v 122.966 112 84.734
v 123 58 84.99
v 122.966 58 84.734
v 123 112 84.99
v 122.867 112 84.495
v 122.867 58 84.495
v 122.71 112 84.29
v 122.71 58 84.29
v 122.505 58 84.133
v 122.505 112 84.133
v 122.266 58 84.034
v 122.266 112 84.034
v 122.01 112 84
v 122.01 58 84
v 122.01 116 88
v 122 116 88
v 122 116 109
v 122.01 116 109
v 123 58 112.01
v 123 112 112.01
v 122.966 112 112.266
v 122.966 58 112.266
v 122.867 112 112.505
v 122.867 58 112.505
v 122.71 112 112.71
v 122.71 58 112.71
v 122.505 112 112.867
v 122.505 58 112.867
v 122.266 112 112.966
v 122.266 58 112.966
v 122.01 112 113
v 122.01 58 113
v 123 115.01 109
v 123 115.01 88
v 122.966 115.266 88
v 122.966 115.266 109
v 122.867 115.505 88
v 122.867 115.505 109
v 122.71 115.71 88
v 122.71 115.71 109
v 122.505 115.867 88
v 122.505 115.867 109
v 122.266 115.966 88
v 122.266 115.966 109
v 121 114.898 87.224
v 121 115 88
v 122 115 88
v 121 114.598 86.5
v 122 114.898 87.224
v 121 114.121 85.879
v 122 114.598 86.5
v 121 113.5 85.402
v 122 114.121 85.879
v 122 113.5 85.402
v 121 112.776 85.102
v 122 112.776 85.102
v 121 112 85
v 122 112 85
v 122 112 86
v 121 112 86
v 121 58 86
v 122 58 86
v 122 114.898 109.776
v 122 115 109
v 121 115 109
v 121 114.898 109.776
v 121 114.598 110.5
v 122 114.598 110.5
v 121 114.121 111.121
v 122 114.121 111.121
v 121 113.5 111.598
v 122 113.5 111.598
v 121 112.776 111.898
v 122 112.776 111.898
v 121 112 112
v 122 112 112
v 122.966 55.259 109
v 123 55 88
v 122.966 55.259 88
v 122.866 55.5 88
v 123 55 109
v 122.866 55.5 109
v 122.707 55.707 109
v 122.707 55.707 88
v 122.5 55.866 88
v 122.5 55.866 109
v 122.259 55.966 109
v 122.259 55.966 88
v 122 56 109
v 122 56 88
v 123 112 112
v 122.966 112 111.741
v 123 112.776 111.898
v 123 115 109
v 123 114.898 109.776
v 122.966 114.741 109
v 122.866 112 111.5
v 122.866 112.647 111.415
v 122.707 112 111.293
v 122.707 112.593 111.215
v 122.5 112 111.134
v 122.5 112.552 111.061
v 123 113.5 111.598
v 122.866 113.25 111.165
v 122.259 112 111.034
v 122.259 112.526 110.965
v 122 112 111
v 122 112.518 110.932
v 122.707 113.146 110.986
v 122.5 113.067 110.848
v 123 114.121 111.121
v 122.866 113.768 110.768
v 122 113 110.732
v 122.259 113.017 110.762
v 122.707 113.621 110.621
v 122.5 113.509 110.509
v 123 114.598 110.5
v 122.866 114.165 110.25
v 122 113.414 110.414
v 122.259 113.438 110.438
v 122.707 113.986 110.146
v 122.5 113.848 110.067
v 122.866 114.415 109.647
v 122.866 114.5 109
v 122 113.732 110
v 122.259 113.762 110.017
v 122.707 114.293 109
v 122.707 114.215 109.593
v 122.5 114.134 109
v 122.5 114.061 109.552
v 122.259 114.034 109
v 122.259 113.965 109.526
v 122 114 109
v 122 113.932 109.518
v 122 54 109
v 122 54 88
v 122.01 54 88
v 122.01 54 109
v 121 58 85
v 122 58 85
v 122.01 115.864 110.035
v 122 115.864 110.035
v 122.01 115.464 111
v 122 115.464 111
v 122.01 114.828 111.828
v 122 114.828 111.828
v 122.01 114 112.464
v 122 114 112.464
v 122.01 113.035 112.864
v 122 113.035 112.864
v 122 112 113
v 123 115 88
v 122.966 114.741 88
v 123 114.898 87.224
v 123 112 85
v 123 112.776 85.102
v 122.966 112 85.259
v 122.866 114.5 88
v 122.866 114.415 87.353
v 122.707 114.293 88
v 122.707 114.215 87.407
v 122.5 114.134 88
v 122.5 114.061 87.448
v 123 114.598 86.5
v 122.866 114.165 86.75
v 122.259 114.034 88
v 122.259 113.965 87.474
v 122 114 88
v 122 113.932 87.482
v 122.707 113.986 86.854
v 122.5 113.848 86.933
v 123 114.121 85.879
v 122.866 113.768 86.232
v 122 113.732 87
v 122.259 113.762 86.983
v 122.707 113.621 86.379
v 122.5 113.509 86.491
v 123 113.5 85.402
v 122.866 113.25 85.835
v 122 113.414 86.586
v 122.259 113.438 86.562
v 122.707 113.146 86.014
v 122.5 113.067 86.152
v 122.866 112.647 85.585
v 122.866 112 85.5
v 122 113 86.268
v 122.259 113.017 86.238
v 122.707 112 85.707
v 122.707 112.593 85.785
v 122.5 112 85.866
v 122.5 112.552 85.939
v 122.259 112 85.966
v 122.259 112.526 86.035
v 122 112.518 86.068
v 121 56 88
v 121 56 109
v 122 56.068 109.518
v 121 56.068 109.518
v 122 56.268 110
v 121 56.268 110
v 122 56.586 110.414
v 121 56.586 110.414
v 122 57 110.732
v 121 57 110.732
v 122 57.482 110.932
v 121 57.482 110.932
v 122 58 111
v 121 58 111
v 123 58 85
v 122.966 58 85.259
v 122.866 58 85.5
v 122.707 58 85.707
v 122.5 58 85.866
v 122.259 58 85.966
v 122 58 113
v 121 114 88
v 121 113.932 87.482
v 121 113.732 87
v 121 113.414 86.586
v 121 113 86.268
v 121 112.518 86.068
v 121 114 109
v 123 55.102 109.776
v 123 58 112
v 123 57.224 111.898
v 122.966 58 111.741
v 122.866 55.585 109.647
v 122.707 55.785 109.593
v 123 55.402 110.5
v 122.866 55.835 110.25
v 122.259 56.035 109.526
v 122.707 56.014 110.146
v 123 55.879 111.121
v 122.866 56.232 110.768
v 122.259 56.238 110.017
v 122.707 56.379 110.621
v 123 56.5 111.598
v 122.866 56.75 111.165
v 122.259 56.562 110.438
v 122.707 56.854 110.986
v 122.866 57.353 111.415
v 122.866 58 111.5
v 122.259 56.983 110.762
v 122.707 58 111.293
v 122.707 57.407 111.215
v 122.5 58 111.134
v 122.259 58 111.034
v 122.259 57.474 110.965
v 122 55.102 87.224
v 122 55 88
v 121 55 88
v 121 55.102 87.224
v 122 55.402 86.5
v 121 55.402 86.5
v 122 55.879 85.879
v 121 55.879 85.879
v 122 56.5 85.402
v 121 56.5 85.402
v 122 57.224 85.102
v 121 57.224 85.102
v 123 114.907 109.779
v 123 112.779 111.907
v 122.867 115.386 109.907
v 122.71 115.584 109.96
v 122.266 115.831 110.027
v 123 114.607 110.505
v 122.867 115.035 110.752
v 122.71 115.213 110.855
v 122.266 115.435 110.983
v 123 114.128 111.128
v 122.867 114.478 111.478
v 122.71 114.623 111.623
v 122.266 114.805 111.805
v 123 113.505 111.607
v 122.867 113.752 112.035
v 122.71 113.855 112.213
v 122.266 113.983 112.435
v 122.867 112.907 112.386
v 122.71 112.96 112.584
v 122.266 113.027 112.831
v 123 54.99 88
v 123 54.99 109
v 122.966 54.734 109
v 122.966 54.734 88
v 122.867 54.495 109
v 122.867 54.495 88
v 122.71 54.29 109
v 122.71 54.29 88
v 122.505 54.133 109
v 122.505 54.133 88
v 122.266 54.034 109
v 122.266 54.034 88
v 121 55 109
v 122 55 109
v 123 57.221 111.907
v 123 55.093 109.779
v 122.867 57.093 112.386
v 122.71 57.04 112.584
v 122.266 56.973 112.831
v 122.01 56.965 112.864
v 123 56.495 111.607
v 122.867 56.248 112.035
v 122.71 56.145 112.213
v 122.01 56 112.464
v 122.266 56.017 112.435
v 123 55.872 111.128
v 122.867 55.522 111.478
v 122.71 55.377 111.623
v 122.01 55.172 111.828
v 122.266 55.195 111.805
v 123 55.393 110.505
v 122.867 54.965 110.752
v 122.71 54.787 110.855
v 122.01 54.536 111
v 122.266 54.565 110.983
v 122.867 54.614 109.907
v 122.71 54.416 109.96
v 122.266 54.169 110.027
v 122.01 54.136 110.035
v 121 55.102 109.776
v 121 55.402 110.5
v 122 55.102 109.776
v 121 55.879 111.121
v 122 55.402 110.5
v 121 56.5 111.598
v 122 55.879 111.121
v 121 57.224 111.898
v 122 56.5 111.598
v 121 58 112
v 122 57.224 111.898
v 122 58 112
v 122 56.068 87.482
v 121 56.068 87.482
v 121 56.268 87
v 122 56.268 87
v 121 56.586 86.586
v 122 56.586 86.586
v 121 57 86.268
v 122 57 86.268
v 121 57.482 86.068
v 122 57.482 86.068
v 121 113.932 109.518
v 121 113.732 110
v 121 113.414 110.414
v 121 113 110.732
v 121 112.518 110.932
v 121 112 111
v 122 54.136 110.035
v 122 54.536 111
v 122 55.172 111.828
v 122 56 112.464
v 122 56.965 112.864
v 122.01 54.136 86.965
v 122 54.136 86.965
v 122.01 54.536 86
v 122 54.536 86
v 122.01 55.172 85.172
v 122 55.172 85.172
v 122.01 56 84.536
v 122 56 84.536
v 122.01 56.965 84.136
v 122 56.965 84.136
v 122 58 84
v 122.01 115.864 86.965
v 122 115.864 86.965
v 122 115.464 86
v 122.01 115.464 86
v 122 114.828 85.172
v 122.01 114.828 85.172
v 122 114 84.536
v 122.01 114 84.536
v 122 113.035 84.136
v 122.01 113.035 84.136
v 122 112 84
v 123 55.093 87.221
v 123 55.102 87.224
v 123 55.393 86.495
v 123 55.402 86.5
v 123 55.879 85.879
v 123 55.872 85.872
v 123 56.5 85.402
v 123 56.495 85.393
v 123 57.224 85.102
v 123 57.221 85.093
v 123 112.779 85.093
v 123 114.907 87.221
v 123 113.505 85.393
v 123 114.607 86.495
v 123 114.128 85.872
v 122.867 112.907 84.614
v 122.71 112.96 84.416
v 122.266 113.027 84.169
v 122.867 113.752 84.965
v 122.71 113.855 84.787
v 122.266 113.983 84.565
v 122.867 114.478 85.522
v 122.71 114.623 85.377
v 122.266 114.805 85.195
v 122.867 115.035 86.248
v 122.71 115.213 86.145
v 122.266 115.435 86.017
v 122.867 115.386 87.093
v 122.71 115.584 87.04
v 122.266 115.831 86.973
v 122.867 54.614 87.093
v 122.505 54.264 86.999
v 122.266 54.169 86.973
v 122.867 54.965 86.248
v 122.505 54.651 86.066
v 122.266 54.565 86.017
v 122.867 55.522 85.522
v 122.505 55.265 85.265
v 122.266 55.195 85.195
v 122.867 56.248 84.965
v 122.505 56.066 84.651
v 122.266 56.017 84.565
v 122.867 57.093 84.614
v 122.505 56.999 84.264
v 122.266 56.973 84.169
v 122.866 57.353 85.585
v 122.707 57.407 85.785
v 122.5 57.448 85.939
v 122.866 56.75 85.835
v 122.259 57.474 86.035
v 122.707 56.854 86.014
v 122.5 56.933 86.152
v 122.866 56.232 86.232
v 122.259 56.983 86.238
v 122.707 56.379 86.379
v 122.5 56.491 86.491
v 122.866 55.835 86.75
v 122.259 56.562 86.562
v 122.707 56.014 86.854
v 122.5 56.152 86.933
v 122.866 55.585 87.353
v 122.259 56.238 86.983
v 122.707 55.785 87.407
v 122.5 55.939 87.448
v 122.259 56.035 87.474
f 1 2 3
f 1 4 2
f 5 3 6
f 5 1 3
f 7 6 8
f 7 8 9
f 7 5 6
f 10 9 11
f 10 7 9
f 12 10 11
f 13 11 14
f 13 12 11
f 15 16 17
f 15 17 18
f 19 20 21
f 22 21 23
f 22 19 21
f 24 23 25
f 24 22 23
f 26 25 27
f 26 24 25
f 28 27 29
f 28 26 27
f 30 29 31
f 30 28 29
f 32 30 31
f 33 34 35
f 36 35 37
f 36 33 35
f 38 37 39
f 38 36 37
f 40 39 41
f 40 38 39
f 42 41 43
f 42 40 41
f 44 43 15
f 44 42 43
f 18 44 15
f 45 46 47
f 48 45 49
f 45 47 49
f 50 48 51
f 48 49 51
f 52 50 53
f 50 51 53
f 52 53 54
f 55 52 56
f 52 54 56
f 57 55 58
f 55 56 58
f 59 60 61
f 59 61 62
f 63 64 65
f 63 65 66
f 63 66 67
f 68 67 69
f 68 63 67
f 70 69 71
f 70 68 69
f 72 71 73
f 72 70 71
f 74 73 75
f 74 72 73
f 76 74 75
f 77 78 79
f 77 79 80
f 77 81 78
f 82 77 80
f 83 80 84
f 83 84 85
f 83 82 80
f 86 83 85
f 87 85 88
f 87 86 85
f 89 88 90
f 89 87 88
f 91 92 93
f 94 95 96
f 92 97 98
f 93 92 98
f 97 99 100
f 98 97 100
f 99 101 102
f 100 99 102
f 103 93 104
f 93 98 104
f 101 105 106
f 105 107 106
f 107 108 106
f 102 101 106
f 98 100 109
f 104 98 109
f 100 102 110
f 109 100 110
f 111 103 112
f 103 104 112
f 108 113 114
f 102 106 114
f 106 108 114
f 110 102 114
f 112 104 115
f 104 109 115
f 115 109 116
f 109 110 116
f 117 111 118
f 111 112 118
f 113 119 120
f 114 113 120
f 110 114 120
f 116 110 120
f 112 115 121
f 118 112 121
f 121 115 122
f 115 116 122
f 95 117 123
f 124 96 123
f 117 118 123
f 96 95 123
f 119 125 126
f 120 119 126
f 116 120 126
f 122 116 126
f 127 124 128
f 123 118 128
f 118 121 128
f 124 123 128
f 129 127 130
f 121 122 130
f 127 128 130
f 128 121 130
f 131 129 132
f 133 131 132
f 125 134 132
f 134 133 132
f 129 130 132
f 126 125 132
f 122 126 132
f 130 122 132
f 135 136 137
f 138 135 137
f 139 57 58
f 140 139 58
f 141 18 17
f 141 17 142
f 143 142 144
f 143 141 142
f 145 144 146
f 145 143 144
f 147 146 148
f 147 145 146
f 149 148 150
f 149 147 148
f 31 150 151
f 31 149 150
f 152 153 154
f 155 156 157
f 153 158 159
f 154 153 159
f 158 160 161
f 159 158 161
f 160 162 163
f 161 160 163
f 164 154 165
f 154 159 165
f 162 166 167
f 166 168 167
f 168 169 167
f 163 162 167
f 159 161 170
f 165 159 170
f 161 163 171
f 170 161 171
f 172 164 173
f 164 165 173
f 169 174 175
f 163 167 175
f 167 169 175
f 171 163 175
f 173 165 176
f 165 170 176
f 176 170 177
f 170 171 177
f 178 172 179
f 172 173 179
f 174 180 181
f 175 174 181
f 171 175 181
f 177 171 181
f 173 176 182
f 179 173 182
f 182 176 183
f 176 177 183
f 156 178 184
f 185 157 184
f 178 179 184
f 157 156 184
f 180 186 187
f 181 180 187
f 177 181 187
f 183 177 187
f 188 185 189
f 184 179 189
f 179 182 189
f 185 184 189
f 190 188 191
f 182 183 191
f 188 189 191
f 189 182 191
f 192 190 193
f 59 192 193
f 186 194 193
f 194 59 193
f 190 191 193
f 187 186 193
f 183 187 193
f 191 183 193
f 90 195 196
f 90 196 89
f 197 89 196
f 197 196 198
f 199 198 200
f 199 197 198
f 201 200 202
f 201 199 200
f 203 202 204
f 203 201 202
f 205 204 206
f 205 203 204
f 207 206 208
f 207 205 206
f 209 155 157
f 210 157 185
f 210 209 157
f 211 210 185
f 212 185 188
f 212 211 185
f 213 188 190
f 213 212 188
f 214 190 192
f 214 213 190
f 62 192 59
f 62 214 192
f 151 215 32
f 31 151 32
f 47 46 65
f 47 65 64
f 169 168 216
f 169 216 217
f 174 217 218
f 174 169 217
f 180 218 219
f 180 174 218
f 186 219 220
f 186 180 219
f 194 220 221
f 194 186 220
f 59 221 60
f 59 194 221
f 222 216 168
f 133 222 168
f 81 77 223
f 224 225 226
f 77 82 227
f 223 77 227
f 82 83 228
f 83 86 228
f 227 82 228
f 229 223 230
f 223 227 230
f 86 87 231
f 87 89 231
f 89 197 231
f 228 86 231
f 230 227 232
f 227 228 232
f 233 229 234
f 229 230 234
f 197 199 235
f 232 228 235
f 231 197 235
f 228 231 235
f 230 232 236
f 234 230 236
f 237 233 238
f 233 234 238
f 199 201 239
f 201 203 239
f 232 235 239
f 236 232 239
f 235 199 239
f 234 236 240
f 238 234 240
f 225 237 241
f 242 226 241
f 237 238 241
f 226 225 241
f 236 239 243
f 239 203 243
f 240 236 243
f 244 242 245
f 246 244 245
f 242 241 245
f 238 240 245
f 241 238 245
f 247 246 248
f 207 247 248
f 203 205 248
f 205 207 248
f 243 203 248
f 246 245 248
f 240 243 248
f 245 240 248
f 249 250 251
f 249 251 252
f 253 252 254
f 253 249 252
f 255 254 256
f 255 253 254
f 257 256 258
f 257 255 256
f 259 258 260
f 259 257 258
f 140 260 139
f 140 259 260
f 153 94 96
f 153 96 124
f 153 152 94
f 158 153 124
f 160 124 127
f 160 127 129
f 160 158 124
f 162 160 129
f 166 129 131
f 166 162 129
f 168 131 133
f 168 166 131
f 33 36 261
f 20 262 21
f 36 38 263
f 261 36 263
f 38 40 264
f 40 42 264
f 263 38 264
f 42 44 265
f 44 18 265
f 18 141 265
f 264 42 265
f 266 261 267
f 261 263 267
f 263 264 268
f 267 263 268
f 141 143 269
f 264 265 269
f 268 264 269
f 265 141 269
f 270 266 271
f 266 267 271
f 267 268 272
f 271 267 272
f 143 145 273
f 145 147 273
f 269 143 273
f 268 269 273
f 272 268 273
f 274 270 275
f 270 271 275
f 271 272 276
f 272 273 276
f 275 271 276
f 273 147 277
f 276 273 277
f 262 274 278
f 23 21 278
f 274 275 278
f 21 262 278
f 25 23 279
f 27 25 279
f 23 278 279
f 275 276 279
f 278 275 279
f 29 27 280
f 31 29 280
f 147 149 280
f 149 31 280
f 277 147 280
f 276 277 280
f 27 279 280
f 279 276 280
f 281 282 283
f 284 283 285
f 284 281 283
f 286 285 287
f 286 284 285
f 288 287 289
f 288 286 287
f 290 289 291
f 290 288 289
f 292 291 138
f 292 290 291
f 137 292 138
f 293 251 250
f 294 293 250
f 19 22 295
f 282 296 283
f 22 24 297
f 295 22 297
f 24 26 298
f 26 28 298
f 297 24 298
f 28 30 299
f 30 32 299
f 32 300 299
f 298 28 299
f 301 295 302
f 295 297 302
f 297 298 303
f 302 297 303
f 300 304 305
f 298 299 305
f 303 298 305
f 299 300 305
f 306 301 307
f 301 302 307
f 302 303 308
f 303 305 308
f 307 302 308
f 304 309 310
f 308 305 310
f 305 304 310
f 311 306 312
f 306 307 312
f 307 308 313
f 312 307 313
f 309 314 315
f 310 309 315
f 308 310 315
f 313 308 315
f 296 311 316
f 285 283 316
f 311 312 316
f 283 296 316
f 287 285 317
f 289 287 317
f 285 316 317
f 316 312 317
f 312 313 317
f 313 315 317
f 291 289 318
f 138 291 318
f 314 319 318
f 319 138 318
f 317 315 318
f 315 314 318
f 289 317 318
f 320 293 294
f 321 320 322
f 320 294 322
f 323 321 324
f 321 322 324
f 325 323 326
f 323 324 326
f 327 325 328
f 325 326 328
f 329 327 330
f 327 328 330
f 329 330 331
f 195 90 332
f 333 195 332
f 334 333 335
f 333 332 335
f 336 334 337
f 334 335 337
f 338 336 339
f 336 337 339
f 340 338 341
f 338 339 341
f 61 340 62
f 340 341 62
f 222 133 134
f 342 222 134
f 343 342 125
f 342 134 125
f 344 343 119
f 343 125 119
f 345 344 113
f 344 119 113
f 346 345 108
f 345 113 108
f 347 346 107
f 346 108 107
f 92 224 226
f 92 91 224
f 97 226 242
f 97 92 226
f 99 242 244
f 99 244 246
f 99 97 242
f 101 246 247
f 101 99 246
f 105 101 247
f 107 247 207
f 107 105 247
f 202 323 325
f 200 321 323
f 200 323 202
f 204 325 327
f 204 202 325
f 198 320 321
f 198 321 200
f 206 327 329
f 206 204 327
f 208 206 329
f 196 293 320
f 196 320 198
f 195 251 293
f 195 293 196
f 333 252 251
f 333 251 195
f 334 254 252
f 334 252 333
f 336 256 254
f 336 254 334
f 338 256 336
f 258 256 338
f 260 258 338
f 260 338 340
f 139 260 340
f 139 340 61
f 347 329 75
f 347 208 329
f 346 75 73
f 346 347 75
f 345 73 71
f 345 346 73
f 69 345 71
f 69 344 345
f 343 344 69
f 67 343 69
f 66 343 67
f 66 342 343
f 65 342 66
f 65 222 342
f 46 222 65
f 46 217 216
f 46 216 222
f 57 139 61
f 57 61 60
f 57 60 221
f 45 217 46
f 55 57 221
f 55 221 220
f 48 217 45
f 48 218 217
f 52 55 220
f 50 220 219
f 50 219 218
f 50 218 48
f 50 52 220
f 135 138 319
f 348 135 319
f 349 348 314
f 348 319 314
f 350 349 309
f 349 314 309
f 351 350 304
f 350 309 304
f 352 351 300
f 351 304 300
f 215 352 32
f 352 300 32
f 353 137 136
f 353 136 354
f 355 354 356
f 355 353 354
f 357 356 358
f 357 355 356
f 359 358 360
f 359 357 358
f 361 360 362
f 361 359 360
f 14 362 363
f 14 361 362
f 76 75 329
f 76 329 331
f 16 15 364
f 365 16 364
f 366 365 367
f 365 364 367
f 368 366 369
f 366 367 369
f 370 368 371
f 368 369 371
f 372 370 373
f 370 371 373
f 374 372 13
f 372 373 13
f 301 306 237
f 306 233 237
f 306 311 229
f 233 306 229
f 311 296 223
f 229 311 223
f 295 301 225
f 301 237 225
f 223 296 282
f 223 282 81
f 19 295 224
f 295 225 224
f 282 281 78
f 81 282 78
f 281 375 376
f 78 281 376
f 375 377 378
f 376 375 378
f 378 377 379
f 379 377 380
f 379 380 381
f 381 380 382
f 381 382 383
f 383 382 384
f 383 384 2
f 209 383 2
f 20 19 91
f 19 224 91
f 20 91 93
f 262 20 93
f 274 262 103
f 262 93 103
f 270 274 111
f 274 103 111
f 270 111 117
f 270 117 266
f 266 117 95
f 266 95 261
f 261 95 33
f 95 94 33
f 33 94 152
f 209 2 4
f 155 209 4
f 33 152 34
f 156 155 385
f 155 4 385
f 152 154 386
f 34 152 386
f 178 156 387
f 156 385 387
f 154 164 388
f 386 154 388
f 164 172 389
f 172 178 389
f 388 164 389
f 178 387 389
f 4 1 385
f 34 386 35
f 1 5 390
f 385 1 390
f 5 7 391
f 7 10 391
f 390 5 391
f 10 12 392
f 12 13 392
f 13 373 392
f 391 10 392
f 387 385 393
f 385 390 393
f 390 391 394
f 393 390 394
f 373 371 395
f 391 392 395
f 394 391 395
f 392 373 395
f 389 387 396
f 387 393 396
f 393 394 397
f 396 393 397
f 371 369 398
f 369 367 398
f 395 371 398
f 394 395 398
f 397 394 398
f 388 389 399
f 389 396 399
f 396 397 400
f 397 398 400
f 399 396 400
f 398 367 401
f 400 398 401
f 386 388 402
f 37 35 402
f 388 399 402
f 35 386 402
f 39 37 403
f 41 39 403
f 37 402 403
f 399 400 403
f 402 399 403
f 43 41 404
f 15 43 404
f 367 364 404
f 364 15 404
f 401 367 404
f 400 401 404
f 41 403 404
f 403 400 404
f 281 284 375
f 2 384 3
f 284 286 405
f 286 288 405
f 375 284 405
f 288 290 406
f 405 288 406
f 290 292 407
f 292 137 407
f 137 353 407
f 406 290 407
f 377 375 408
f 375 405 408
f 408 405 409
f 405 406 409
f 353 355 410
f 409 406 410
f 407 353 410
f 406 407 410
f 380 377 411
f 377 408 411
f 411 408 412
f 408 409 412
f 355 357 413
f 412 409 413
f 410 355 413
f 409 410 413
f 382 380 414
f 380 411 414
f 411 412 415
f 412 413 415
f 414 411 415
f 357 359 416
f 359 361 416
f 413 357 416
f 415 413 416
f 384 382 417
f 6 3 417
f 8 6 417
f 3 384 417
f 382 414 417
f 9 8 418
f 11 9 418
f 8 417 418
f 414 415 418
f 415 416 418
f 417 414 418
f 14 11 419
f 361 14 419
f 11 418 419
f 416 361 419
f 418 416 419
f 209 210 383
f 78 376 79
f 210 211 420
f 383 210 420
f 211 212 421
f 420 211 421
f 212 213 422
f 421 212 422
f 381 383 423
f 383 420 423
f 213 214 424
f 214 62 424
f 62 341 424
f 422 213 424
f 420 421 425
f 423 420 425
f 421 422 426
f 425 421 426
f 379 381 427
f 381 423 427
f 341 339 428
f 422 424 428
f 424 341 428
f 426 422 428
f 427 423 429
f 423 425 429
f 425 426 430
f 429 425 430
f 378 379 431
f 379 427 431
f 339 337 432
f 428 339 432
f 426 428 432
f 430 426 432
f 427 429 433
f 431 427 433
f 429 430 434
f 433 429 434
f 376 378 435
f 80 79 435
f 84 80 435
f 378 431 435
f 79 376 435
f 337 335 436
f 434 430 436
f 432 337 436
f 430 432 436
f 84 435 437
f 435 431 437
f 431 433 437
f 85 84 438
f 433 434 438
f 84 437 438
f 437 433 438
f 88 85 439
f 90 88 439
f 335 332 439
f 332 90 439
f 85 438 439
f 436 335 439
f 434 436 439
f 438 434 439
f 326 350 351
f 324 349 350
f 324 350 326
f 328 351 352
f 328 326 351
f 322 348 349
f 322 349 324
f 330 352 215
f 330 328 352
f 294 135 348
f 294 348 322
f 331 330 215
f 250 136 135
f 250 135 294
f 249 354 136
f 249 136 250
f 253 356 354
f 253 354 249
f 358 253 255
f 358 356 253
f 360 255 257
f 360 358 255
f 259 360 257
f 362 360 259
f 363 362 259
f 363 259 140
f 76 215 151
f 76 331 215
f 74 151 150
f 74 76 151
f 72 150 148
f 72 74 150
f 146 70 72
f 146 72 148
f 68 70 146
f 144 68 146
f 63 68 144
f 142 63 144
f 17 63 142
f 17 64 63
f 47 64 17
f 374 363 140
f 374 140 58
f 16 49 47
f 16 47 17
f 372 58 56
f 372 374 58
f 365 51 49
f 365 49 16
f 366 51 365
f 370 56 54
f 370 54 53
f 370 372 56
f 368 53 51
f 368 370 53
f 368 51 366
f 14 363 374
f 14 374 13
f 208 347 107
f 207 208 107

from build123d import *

# Parameters (mm, degrees)
BOX048_W     = 5
BOX048_H     = 58
BOX048_DEPTH = 25
FILLET053_R  = 2
BOX050_W     = 1
BOX050_H     = 62
BOX050_DEPTH = 29
FILLET055_R  = 4
BOX049_W     = 2
BOX049_H     = 60
BOX049_DEPTH = 27
FILLET054_R  = 3
FILLET056_R  = 1
FILLET057_R  = 0.99


with BuildPart() as fillet053:
    # Box048 → Box048 (new body)
    with BuildSketch(Plane(origin=(118, 56, 86), x_dir=(1, 0, 0), z_dir=(0, 0, 1))):
        with Locations((2.5, 29)):
            Rectangle(BOX048_W, BOX048_H)
    extrude(amount=BOX048_DEPTH)

    # Fillet053
    fillet053_edges = [fillet053.edges().sort_by_distance(p)[0] for p in [
        (120.5, 56, 86),
        (120.5, 56, 111),
        (120.5, 114, 86),
        (120.5, 114, 111),
    ]]
    fillet(fillet053_edges, radius=FILLET053_R)


with BuildPart() as fillet055:
    # Box050 → Box050 (new body)
    with BuildSketch(Plane(origin=(118, 54, 84), x_dir=(1, 0, 0), z_dir=(0, 0, 1))):
        with Locations((0.5, 31)):
            Rectangle(BOX050_W, BOX050_H)
    extrude(amount=BOX050_DEPTH)

    # Fillet055
    fillet055_edges = [fillet055.edges().sort_by_distance(p)[0] for p in [
        (118.5, 54, 84),
        (118.5, 54, 113),
        (118.5, 116, 84),
        (118.5, 116, 113),
    ]]
    fillet(fillet055_edges, radius=FILLET055_R)


with BuildPart() as fillet055_1:
    # Fillet055 placement: moved
    add(fillet055.part.moved(Location((4, 0, 0))))


with BuildPart() as fillet057:
    # Box049 → Box049 (new body)
    with BuildSketch(Plane(origin=(118, 55, 85), x_dir=(1, 0, 0), z_dir=(0, 0, 1))):
        with Locations((1, 30)):
            Rectangle(BOX049_W, BOX049_H)
    extrude(amount=BOX049_DEPTH)

    # Fillet054
    fillet054_edges = [fillet057.edges().sort_by_distance(p)[0] for p in [
        (119, 55, 85),
        (119, 55, 112),
        (119, 115, 85),
        (119, 115, 112),
    ]]
    fillet(fillet054_edges, radius=FILLET054_R)


with BuildPart() as fillet057_1:
    # Fillet054 placement: moved
    add(fillet057.part.moved(Location((3, 0, 0))))

    # Fusion006: union Fillet055
    add(fillet055_1.part)

    # Cut036: cut Fillet053
    add(fillet053.part, mode=Mode.SUBTRACT)

    # Fillet056
    fillet056_edges = [fillet057_1.edges().sort_by_distance(p)[0] for p in [
        (123, 85, 111),
        (123, 85, 86),
    ]]
    fillet(fillet056_edges, radius=FILLET056_R)

    # Fillet057
    fillet057_edges = [fillet057_1.edges().sort_by_distance(p)[0] for p in [
        (123, 85, 84),
        (123, 85, 113),
    ]]
    fillet(fillet057_edges, radius=FILLET057_R)


solid = fillet057_1.part
